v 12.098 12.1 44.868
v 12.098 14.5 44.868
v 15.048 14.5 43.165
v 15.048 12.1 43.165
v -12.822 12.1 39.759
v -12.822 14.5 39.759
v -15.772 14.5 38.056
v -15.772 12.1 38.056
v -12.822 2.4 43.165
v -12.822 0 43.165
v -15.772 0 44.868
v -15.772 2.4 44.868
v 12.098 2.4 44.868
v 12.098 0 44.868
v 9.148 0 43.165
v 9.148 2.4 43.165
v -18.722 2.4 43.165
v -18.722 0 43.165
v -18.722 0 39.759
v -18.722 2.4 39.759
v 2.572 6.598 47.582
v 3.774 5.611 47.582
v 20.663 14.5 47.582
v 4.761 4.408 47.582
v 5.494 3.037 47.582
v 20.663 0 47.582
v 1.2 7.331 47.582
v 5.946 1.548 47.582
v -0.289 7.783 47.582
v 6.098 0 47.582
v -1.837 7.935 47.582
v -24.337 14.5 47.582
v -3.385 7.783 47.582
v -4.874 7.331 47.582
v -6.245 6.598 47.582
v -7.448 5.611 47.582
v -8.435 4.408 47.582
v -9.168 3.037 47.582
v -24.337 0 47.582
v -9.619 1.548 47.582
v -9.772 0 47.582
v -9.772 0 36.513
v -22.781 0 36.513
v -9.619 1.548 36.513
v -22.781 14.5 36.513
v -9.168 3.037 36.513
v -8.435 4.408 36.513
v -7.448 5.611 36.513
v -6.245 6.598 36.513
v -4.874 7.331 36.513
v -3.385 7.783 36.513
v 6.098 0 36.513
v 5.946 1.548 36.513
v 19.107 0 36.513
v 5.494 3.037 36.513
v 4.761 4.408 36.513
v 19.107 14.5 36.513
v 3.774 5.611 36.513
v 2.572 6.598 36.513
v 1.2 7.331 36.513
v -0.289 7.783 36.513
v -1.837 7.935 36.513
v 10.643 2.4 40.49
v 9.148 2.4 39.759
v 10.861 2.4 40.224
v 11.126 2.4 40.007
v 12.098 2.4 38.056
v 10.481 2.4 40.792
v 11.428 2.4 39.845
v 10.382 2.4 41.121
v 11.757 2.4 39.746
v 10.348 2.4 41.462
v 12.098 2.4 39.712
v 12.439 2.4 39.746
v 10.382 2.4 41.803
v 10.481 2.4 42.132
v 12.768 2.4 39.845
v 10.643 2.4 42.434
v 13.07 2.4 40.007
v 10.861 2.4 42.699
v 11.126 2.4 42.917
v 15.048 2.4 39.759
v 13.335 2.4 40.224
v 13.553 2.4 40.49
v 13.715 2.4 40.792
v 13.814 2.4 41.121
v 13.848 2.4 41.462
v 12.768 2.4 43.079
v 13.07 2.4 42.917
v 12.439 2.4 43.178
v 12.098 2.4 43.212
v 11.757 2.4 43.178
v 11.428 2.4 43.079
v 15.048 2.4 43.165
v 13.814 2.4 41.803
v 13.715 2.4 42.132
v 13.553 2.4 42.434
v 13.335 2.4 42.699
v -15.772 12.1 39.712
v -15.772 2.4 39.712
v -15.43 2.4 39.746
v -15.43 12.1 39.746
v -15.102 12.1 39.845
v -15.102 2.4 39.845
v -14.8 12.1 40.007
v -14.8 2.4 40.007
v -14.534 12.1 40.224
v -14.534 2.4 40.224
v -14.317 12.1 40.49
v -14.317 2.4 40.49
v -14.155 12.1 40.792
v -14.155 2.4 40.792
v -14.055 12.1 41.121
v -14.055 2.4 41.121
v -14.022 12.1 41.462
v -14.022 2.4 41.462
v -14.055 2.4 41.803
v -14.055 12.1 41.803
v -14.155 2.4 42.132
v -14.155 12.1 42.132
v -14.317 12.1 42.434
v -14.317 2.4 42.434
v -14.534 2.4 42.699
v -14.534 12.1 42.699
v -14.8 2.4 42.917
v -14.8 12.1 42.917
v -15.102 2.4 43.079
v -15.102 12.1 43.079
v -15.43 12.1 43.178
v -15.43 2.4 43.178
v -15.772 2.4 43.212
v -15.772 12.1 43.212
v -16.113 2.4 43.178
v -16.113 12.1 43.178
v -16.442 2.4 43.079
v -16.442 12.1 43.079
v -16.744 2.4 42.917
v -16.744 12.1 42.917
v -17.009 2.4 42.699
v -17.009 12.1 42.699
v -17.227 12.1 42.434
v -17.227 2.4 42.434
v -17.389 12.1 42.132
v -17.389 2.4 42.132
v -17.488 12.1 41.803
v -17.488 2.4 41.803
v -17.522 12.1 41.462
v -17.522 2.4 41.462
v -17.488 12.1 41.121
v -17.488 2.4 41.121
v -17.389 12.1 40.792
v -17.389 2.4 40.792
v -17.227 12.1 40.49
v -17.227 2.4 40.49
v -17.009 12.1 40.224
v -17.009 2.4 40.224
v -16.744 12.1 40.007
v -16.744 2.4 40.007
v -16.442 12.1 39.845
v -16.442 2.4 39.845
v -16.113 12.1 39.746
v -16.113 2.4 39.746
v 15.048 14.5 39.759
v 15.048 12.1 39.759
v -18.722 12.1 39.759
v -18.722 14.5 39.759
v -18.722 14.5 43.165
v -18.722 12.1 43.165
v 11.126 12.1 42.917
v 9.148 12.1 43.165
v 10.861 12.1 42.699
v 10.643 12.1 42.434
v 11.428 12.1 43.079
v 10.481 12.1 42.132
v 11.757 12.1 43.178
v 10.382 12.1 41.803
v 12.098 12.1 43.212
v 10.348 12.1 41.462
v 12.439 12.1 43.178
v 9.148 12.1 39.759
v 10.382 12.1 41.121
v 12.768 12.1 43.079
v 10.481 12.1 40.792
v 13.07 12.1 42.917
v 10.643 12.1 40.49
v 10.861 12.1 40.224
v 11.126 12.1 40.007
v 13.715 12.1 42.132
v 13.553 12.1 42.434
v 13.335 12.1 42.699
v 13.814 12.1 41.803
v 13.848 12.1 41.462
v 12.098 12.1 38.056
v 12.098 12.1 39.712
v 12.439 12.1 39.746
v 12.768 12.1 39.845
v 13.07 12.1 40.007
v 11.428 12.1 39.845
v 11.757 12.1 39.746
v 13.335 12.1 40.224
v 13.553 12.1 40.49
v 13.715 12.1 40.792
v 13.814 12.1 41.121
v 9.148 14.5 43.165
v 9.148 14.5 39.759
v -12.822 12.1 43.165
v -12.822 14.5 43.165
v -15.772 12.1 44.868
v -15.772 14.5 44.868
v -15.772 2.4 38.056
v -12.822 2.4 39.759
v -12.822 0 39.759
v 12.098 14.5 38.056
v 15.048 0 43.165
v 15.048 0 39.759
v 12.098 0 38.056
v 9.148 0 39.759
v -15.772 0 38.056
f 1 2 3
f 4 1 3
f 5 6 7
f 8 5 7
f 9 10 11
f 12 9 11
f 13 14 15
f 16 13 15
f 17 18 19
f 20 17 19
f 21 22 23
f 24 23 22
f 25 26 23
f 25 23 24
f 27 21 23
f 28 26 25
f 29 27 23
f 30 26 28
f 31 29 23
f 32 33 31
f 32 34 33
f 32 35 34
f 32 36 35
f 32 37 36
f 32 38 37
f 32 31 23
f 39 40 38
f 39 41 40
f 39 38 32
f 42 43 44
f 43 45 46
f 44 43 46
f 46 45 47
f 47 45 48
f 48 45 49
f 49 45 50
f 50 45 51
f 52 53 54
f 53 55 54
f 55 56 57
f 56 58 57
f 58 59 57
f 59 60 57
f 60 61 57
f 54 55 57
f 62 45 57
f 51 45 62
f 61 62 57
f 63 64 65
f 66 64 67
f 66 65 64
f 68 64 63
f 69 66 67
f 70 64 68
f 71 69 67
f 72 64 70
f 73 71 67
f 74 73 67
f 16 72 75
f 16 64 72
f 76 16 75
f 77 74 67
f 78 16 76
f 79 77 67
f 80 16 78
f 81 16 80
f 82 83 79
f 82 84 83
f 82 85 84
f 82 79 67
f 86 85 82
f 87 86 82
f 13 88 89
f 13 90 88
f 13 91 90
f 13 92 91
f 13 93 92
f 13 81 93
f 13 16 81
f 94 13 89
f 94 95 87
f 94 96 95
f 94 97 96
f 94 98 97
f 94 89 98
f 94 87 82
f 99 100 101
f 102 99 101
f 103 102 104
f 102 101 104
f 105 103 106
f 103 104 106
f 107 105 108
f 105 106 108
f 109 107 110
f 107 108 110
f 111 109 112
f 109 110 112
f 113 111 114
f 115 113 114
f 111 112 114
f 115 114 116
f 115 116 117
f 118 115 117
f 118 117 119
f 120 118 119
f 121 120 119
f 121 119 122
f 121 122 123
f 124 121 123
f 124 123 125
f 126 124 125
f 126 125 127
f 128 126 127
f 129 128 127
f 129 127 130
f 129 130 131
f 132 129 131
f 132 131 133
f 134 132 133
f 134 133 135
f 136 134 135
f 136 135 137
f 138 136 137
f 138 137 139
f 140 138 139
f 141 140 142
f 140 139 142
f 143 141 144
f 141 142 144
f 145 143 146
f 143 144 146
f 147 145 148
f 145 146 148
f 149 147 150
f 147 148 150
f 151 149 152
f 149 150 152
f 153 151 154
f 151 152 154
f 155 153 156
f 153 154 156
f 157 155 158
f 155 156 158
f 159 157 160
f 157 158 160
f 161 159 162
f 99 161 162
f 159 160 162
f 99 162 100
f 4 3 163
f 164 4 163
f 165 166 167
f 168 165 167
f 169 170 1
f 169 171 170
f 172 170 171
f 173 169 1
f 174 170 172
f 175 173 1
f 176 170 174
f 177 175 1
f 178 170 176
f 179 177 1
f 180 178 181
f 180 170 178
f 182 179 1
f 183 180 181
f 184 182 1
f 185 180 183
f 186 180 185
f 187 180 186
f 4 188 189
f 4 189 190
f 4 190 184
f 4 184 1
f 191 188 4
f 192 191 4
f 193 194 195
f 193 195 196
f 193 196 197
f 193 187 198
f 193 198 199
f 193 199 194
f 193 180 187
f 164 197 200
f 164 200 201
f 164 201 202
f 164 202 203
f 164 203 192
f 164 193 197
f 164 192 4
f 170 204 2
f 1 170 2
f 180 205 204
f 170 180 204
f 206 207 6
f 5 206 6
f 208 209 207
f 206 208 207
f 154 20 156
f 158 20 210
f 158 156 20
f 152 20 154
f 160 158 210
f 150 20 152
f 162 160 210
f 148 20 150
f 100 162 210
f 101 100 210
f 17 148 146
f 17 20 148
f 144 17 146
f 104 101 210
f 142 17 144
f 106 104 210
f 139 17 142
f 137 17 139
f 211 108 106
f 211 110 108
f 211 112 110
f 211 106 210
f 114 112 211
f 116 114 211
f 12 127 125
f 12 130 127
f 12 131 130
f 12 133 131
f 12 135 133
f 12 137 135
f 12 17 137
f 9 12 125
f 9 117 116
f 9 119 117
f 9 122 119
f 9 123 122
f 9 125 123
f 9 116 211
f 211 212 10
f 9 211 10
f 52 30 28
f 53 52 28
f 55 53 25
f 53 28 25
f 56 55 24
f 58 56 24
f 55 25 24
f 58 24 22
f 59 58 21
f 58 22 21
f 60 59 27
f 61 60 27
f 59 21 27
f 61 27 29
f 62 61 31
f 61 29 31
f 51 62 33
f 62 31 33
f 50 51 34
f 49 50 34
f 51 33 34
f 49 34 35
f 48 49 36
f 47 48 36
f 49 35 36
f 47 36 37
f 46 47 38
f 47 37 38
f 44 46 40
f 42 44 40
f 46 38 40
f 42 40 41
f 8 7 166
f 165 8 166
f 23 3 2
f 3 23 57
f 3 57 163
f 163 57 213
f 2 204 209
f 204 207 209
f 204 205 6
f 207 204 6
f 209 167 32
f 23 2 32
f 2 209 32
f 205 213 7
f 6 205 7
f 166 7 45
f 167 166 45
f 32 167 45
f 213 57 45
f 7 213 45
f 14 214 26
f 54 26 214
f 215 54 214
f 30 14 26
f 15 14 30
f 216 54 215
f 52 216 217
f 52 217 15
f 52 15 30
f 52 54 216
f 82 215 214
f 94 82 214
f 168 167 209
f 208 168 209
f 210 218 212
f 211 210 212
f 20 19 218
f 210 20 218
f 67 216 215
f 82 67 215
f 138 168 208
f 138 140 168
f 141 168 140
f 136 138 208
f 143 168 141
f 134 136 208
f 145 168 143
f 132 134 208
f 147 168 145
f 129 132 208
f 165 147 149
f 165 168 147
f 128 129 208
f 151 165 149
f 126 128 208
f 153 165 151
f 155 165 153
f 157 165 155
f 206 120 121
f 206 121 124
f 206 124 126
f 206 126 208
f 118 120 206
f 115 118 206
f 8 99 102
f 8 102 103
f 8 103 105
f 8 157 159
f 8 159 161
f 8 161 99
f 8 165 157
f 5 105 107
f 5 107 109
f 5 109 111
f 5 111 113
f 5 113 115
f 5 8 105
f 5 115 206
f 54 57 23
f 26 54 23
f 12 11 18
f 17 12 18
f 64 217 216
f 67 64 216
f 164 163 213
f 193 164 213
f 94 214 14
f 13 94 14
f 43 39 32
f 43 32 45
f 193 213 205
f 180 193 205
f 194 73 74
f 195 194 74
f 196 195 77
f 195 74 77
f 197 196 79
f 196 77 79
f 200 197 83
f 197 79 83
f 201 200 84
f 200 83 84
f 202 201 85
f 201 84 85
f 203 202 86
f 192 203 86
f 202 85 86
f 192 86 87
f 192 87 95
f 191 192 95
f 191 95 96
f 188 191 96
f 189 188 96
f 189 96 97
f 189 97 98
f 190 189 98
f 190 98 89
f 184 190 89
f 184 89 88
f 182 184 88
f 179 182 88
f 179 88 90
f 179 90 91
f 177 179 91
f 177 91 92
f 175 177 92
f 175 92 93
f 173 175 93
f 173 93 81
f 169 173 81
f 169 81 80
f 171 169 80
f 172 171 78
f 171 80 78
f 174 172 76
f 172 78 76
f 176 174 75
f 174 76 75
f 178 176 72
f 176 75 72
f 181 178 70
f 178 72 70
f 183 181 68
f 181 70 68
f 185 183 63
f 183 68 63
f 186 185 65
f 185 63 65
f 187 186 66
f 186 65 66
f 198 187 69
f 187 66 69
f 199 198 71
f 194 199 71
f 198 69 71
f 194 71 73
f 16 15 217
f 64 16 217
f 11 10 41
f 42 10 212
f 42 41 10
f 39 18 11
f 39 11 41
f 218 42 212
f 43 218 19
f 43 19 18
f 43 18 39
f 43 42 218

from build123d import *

# Parameters (mm, degrees)
BOSS_EXTRUDE3_DEPTH              = 14.5
SKETCH8_R                        = 7.935
CUT_EXTRUDE3_DEPTH               = 88
CUT_EXTRUDE9_DEPTH               = 2.4
F_39_0_13779528_DIAMETER_HOLE1_D = 3.500000112
CUT_EXTRUDE10_DEPTH              = 22.4
CUT_EXTRUDE11_DEPTH              = 2.4


with BuildPart() as part:
    # Sketch6 → Boss-Extrude3 (new body)
    with BuildSketch(Plane(origin=(0, 0, 0), x_dir=(1, 0, 0), z_dir=(0, 1, 0))):
        Polygon((-16.836914056, 5.783353512), (13.163085944, 5.783353512), (20.663085944, -47.581919406), (-24.336914056, -47.581919406), align=None)
    extrude(amount=BOSS_EXTRUDE3_DEPTH)

    # Sketch8 → Cut-Extrude3 (cut)
    with BuildSketch(Plane.XY.offset(47.581919406)):
        with Locations((-1.836914056, 0)):
            Circle(SKETCH8_R)
    extrude(amount=-CUT_EXTRUDE3_DEPTH, mode=Mode.SUBTRACT)

    # Sketch18 → Cut-Extrude9 (cut)
    with BuildSketch(Plane(origin=(0, 14.5, 0), x_dir=(1, 0, 0), z_dir=(0, 1, 0))):
        Polygon((-15.771819769, -44.868285994), (-12.821819769, -43.1651027), (-12.821819769, -39.758736112), (-15.771819769, -38.055552818), (-18.721819769, -39.758736112), (-18.721819769, -43.1651027), align=None)
        Polygon((12.097991657, -44.868285994), (15.047991657, -43.1651027), (15.047991657, -39.758736112), (12.097991657, -38.055552818), (9.147991657, -39.758736112), (9.147991657, -43.1651027), align=None)
        Polygon((11.389331688, -26.016021021), (14.389331688, -24.283970214), (14.389331688, -20.819868599), (11.389331688, -19.087817791), (8.389331688, -20.819868599), (8.389331688, -24.283970214), align=None)
        Polygon((-15.0631598, -26.016021021), (-12.0631598, -24.283970214), (-12.0631598, -20.819868599), (-15.0631598, -19.087817791), (-18.0631598, -20.819868599), (-18.0631598, -24.283970214), align=None)
    extrude(amount=-CUT_EXTRUDE9_DEPTH, mode=Mode.SUBTRACT)

    # #39 (0.13779528) Diameter Hole1 (through all)
    with Locations(Plane(origin=(-15.0631598, 14.5, 22.551919406), x_dir=(0, 0, 1), z_dir=(0, 1, 0))):
        with Locations((0, 0), (0, 26.452491488), (18.91, -0.708659969), (18.91, 27.161151457)):
            Hole(F_39_0_13779528_DIAMETER_HOLE1_D / 2)

    # Sketch22 → Cut-Extrude10 (cut)
    with BuildSketch(Plane(origin=(0, 14.5, 0), x_dir=(1, 0, 0), z_dir=(0, 1, 0))):
        Polygon((-22.781301734, -36.51316259), (19.107473622, -36.51316259), (13.163085944, 5.783353512), (-16.836914056, 5.783353512), align=None)
    extrude(amount=-CUT_EXTRUDE10_DEPTH, mode=Mode.SUBTRACT)

    # Sketch24 → Cut-Extrude11 (cut)
    with BuildSketch(Plane.XZ):
        Polygon((-15.771819769, 38.055552818), (-12.821819769, 39.758736112), (-12.821819769, 43.1651027), (-15.771819769, 44.868285994), (-18.721819769, 43.1651027), (-18.721819769, 39.758736112), align=None)
        Polygon((12.097991657, 38.055552818), (15.047991657, 39.758736112), (15.047991657, 43.1651027), (12.097991657, 44.868285994), (9.147991657, 43.1651027), (9.147991657, 39.758736112), align=None)
    extrude(amount=-CUT_EXTRUDE11_DEPTH, mode=Mode.SUBTRACT)


solid = part.part
